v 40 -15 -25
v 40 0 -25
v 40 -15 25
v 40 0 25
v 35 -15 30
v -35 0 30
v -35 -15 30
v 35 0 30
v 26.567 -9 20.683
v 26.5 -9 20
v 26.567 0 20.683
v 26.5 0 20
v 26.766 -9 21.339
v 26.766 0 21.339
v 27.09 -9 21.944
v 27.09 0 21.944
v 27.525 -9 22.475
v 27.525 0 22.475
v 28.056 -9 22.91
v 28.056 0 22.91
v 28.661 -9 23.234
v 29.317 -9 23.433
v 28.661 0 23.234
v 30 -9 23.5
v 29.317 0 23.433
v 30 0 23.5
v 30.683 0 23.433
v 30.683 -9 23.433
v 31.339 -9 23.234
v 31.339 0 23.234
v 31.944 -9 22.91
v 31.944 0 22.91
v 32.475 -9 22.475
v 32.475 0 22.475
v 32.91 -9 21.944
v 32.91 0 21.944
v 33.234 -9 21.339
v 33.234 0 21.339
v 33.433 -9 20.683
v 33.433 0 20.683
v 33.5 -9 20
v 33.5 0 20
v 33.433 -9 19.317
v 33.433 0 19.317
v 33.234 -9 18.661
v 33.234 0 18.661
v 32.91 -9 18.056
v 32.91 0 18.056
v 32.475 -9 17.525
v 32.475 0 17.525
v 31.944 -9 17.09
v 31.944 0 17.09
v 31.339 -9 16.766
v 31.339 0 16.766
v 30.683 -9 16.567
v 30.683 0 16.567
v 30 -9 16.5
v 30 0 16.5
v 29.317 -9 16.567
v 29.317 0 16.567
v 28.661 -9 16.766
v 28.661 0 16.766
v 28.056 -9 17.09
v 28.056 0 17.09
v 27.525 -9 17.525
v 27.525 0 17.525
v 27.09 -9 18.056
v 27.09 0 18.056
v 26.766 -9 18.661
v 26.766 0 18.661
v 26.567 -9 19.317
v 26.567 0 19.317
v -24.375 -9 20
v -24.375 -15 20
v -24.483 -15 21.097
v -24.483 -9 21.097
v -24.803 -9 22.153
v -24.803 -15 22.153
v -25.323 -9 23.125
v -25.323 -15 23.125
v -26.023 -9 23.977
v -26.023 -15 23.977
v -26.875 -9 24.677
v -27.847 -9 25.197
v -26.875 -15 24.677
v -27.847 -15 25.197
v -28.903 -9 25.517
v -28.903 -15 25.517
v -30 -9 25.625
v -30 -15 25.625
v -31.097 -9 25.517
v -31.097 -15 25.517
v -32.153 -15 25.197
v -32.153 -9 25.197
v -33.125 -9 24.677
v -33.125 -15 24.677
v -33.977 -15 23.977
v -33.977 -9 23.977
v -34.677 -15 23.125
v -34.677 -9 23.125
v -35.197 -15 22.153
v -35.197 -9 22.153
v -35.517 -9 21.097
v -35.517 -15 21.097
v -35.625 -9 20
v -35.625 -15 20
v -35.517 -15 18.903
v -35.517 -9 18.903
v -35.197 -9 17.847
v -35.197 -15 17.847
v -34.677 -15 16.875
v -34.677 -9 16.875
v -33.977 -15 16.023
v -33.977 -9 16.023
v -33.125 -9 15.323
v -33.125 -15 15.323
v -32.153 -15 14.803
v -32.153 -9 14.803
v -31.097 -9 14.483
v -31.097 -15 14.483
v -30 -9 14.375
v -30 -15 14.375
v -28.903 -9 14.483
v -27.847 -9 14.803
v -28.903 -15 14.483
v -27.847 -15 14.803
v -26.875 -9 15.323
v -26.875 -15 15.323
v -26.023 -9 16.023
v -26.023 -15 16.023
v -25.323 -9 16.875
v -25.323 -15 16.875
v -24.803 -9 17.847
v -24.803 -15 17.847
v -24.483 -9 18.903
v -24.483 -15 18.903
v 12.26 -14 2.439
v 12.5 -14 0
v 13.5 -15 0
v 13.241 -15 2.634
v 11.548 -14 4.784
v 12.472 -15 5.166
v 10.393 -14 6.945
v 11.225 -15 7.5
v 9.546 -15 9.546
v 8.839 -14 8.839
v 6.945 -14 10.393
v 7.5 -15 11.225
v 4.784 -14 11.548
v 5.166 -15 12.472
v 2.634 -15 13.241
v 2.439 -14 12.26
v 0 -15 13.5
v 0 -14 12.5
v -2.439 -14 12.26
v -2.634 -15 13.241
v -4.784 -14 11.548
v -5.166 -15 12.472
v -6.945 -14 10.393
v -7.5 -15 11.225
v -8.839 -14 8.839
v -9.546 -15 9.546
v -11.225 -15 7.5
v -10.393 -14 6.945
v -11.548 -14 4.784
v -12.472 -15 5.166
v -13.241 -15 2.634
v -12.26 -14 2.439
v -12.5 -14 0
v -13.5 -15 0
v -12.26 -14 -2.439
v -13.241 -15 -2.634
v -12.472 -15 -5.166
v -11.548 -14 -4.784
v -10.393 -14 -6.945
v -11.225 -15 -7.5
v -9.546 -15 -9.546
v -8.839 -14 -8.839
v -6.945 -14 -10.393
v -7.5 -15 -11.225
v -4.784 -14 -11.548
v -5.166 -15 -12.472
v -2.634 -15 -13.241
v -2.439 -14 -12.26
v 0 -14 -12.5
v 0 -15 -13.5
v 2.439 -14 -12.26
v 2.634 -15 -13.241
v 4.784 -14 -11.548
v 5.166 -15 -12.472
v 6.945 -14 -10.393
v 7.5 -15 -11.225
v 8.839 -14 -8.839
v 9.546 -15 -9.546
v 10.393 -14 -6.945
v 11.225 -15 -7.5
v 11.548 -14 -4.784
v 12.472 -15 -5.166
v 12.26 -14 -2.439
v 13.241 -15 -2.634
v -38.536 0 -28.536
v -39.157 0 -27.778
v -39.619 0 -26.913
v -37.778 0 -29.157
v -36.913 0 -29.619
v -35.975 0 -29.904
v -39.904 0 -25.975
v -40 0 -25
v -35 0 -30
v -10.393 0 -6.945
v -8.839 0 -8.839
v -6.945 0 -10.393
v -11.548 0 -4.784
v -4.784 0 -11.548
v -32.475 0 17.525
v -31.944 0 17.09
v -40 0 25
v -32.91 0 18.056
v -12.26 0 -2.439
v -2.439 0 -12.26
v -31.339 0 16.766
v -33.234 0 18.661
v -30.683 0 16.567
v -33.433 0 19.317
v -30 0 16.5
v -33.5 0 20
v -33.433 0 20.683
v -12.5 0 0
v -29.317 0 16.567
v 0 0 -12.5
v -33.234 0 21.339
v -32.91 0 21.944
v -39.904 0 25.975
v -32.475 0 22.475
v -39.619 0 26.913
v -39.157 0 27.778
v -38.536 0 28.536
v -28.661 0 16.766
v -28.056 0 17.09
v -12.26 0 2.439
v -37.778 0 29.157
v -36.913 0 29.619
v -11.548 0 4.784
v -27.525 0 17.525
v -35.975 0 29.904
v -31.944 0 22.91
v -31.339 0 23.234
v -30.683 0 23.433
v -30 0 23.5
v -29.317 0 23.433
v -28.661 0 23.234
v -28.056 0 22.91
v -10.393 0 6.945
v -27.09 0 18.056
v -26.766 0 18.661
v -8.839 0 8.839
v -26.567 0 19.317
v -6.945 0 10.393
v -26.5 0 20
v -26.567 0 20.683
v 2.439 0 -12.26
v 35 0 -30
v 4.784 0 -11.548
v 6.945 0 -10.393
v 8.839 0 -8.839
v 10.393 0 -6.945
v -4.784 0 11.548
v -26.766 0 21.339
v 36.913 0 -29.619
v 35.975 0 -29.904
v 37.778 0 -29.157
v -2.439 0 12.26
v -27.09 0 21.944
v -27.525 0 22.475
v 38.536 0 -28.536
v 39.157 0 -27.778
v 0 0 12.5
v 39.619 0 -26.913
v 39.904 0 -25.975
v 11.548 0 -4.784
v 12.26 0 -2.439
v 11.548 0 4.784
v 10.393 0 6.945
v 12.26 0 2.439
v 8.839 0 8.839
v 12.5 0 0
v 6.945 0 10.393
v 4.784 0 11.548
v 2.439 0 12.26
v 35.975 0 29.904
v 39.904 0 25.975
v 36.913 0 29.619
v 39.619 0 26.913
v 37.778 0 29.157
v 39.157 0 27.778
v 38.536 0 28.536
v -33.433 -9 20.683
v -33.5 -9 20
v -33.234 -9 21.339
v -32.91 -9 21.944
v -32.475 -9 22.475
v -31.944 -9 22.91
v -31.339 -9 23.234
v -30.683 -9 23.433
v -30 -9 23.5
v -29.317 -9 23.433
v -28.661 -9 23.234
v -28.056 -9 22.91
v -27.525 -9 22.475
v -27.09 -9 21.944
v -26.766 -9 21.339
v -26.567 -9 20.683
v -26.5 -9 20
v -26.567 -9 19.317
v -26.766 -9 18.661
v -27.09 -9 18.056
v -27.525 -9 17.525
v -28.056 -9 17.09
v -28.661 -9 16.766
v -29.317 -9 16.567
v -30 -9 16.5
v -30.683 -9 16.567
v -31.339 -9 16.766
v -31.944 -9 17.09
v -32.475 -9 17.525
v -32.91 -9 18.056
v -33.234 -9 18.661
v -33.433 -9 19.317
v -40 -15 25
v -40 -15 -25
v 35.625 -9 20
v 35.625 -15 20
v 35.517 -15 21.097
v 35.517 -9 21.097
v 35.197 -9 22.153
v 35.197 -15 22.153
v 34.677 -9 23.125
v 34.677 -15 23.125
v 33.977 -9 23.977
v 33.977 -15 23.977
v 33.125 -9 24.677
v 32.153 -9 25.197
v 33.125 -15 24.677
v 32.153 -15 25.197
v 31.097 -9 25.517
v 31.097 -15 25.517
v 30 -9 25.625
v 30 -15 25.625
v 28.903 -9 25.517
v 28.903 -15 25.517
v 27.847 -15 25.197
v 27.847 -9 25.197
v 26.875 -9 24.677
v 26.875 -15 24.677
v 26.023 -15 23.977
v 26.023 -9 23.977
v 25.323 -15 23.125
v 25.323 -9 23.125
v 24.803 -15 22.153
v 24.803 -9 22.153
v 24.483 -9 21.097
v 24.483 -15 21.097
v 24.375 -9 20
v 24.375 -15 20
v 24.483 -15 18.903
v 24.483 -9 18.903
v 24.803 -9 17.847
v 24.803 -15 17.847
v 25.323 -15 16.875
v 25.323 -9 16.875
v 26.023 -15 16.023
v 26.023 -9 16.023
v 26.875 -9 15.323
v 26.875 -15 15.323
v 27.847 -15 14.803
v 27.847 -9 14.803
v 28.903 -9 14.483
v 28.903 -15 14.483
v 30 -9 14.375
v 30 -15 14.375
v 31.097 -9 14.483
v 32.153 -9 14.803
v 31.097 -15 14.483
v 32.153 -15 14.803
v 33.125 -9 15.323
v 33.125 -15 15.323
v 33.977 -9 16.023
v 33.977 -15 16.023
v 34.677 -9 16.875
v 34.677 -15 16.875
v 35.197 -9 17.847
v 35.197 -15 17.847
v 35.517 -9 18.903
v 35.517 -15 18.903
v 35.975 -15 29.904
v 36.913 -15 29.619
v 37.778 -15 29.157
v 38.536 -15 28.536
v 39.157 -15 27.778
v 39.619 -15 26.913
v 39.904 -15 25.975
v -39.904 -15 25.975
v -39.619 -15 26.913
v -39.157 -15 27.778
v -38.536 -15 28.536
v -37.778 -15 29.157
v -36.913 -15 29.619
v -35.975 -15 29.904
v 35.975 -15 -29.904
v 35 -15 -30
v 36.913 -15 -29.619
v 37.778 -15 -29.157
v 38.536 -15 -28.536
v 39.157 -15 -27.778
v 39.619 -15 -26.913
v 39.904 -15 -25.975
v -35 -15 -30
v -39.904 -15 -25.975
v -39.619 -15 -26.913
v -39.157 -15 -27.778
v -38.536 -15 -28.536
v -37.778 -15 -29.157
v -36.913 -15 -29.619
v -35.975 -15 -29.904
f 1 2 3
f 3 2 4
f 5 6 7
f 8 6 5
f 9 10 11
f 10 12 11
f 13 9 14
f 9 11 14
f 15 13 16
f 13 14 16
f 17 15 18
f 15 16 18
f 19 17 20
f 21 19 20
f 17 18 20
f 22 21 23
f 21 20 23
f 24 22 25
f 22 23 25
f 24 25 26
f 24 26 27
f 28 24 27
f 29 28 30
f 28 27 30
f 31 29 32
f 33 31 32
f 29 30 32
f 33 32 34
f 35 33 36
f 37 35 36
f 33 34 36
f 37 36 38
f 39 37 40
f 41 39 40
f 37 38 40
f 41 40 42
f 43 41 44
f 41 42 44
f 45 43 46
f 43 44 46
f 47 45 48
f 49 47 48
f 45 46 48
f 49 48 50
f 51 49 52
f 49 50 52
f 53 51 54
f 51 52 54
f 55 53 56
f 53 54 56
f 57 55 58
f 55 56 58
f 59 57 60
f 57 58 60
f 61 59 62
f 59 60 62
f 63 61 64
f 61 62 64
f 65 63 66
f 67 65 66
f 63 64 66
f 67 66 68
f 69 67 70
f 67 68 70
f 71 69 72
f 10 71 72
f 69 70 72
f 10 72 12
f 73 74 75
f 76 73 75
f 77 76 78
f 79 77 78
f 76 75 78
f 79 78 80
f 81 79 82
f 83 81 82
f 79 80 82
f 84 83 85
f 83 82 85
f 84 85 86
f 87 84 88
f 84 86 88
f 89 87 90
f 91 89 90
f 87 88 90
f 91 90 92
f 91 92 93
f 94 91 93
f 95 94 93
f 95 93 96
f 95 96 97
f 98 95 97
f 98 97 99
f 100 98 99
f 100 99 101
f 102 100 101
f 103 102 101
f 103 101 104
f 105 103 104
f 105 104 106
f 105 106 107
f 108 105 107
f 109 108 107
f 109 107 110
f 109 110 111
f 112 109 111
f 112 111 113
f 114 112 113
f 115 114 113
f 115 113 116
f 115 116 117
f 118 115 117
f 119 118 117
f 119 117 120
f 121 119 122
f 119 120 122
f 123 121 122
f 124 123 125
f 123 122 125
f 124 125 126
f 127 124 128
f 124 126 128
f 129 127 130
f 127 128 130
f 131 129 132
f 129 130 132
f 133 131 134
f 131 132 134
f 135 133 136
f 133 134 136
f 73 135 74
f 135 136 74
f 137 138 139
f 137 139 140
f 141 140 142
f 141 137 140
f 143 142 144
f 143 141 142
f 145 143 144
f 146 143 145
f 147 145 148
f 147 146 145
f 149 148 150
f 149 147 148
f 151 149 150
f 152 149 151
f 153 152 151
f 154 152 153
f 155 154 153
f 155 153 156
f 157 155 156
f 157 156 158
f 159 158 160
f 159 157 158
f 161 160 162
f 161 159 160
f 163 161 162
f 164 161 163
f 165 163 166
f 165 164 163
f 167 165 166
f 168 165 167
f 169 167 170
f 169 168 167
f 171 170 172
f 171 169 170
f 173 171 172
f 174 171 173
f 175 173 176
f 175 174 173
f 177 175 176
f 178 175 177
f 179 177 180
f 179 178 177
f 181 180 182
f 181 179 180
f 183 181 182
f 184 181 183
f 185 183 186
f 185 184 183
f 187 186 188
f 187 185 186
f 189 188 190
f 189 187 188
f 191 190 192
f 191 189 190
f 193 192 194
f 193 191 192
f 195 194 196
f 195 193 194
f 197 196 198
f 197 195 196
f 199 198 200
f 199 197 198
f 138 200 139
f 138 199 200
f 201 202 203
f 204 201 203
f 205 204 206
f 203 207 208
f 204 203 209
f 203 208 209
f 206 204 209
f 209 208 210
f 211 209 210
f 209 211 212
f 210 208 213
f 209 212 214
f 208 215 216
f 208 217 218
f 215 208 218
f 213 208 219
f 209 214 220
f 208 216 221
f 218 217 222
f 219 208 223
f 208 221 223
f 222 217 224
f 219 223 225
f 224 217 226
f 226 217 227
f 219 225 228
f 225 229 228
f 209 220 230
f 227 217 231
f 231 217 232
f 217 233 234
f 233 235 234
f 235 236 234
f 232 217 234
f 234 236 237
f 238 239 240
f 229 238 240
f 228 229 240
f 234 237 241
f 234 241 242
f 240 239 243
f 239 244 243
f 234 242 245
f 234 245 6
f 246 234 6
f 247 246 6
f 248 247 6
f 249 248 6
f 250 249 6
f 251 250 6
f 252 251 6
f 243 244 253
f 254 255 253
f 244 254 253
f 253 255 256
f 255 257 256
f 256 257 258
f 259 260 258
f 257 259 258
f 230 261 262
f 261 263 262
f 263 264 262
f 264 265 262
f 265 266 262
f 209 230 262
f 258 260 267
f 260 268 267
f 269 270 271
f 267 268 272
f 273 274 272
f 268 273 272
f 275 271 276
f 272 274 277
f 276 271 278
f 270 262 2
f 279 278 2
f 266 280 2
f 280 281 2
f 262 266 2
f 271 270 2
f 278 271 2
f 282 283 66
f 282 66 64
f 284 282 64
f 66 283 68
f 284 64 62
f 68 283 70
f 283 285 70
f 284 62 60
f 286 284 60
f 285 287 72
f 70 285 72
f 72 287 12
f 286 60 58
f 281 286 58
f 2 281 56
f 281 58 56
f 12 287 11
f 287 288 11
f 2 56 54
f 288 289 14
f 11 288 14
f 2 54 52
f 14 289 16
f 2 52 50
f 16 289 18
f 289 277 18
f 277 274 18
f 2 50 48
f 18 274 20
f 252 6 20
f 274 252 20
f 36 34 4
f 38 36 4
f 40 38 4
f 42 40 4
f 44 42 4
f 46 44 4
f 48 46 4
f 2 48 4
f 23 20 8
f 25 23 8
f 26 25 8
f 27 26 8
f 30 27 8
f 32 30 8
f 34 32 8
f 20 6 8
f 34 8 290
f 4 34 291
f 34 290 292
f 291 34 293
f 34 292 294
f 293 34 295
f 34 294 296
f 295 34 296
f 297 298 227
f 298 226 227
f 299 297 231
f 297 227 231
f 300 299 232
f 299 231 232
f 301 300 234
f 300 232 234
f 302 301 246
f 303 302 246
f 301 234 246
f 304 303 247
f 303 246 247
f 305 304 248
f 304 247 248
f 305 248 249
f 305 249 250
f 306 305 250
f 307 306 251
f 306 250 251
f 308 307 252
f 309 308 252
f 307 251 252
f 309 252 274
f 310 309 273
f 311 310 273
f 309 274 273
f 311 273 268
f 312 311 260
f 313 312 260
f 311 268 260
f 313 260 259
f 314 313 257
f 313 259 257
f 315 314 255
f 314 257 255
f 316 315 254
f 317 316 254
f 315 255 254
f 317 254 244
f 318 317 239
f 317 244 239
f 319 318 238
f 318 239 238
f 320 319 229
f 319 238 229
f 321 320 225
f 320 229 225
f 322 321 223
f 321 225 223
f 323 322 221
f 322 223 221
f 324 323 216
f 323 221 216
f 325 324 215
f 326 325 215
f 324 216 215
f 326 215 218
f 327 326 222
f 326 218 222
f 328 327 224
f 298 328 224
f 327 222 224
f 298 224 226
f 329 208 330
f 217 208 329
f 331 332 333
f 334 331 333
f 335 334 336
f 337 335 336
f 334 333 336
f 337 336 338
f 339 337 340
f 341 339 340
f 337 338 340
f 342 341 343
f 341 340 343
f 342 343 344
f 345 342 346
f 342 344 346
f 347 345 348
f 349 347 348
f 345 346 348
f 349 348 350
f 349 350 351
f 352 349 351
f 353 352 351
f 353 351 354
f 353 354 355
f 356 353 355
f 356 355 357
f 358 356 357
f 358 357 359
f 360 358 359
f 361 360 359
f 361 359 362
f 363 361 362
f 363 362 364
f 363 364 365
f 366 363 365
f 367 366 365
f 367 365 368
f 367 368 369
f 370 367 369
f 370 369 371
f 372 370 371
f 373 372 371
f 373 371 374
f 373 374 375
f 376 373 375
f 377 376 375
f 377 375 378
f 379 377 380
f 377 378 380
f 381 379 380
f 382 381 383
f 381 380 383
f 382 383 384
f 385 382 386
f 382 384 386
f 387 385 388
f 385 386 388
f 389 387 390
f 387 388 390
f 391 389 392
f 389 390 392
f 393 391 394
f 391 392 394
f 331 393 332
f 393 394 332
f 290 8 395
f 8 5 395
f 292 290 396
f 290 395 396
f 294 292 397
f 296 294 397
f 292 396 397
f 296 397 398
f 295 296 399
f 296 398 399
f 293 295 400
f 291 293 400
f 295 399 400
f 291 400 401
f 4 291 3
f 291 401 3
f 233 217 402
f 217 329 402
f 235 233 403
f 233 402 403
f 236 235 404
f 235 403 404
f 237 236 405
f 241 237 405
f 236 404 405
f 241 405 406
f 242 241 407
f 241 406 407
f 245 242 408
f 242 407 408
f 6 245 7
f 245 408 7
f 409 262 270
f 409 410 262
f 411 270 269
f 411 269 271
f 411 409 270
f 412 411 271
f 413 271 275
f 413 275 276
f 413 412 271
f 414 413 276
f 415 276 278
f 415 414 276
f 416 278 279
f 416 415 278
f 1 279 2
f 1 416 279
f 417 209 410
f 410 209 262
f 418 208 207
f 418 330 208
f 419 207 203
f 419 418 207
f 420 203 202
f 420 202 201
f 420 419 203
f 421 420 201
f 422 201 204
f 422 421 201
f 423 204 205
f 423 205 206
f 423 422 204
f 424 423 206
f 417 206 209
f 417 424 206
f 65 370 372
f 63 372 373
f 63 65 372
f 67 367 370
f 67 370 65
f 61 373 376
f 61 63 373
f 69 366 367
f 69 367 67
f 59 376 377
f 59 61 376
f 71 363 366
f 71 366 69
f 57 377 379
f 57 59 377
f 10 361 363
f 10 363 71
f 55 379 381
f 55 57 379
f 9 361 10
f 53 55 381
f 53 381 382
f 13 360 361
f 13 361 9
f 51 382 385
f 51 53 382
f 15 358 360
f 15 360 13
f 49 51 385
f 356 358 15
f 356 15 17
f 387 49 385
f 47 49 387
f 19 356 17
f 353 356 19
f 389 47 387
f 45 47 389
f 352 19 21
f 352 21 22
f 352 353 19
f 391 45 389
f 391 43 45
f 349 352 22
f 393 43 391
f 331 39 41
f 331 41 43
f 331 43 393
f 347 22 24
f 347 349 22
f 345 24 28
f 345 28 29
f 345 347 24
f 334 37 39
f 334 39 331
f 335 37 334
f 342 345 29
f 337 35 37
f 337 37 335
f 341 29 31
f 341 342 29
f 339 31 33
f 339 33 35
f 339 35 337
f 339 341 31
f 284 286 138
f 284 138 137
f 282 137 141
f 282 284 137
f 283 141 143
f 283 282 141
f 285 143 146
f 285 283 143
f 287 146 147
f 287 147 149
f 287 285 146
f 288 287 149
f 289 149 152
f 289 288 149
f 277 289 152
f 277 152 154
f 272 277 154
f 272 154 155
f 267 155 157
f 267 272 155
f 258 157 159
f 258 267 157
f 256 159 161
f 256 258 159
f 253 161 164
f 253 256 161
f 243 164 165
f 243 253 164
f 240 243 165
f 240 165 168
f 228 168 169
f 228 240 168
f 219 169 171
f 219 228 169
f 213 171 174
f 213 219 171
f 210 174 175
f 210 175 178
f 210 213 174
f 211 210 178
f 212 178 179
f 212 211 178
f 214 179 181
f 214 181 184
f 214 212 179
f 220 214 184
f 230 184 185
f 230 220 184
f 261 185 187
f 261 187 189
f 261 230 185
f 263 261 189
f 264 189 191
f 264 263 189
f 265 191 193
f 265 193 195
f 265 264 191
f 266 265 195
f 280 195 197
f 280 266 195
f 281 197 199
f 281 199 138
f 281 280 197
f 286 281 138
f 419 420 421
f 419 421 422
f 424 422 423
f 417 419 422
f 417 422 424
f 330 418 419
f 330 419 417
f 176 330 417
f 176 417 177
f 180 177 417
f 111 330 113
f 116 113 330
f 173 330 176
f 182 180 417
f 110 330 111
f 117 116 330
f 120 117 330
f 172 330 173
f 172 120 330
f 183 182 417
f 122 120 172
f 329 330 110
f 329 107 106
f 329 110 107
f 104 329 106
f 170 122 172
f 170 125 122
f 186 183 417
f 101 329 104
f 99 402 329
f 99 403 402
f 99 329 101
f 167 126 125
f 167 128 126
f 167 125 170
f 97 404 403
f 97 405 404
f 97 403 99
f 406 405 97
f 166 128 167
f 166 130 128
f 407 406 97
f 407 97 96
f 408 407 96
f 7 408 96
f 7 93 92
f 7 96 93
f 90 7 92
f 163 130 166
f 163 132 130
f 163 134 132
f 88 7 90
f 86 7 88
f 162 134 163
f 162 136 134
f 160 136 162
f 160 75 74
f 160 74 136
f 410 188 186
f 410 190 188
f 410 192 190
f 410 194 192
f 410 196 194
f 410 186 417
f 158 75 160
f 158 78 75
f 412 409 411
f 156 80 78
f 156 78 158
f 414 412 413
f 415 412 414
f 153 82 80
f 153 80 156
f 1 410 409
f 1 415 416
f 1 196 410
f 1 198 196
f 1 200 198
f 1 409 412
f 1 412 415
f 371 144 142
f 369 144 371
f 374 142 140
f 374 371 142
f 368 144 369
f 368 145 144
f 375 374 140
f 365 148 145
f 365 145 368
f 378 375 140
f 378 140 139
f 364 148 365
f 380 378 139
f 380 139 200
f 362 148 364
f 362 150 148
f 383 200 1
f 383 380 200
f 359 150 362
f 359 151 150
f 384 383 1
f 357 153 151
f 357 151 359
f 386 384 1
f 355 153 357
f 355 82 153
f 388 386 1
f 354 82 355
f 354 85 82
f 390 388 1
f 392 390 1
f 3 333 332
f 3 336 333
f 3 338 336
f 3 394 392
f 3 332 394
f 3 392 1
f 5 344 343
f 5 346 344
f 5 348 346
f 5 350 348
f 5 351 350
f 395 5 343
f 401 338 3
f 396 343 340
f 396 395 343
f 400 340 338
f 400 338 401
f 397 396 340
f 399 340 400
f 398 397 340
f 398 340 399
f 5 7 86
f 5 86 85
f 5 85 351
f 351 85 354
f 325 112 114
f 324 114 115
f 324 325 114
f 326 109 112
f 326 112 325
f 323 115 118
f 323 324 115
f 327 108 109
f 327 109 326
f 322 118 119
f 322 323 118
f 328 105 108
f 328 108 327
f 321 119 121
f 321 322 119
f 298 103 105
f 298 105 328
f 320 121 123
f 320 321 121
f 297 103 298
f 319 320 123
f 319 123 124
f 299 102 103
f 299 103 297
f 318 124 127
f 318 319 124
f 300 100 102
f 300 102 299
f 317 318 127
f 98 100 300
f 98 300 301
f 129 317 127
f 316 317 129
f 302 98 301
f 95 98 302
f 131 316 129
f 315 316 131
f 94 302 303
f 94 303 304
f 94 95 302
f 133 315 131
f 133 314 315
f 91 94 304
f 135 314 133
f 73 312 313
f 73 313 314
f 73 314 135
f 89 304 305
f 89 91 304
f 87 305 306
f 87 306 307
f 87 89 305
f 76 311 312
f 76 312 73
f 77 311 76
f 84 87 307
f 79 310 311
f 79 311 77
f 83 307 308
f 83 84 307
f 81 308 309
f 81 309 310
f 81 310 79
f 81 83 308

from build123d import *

# Parameters (mm, degrees)
F0_W           = 80
F0_H           = 60
F0_R           = 12.5
F1_DEPTH       = 15
F3_D           = 7
F3_CBORE_D     = 11.25
F3_CBORE_DEPTH = 6
F4_R           = 5
F5_SIZE        = 1


with BuildPart() as f1:
    # F0 (on Front) → F1 (new body)
    with BuildSketch(Plane.XZ):
        Rectangle(F0_W, F0_H)
        Circle(F0_R, mode=Mode.SUBTRACT)
    extrude(amount=F1_DEPTH)

    # F3 (through all)
    with Locations(Plane.XZ.offset(15)):
        with Locations((-30, 20), (30, 20)):
            CounterBoreHole(F3_D / 2, F3_CBORE_D / 2, F3_CBORE_DEPTH)

    # F4
    f4_edges = [f1.edges().sort_by_distance(p)[0] for p in [
        (40, -7.5, 30),
        (40, -7.5, -30),
        (-40, -7.5, 30),
        (-40, -7.5, -30),
    ]]
    fillet(f4_edges, radius=F4_R)

    # F5
    f5_edges = [f1.edges().sort_by_distance(p)[0] for p in [
        (-12.5, -15, 0),
    ]]
    chamfer(f5_edges, length=F5_SIZE)


solid = f1.part
